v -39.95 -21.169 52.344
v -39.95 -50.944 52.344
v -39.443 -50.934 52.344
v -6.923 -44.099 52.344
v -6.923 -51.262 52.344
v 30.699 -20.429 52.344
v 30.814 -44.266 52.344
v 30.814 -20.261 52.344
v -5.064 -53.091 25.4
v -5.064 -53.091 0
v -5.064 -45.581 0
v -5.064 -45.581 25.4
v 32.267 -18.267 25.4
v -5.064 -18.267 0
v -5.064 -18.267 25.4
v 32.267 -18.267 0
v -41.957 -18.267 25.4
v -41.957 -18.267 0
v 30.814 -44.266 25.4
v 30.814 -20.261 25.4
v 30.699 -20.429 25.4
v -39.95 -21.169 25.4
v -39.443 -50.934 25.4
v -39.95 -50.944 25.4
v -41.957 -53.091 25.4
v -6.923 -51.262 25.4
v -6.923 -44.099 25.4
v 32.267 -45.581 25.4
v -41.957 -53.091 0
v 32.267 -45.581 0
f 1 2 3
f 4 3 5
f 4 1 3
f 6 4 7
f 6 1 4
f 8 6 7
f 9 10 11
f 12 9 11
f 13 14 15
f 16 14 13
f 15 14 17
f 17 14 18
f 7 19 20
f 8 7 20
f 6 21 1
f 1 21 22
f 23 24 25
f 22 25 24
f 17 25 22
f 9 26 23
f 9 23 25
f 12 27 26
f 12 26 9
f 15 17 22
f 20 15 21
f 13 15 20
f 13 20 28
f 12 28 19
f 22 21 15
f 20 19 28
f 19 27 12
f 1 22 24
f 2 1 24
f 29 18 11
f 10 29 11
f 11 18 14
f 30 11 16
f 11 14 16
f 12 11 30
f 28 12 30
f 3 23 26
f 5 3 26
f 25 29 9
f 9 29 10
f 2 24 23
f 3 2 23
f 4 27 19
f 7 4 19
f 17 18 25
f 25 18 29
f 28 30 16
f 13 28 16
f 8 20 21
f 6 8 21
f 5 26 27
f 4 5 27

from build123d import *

# Parameters (mm, degrees)
F0_W     = 37.331247
F0_H     = 27.314525
F1_DEPTH = 25.4
F3_DEPTH = 26.944021


with BuildPart() as f1:
    # F0 (on Top) → F1 (new body)
    with BuildSketch(Plane.XY):
        Polygon((-5.064317, -18.266939), (-41.957065, -18.266939), (-41.957065, -53.090654), (-5.064317, -53.090654), (-5.064317, -45.581464), align=None)
        with Locations((13.601306, -31.924201)):
            Rectangle(F0_W, F0_H)
    extrude(amount=F1_DEPTH)

    # F2 (on face) → F3 (join)
    with BuildSketch(Plane.XY.offset(25.4)):
        Polygon((30.699346, -20.429492), (-39.95049, -21.168509), (-39.95049, -50.943833), (-39.442882, -50.934415), (-6.923128, -51.261608), (-6.923128, -44.098966), (30.813994, -44.266075), (30.813994, -20.261256), align=None)
    extrude(amount=F3_DEPTH)


solid = f1.part
